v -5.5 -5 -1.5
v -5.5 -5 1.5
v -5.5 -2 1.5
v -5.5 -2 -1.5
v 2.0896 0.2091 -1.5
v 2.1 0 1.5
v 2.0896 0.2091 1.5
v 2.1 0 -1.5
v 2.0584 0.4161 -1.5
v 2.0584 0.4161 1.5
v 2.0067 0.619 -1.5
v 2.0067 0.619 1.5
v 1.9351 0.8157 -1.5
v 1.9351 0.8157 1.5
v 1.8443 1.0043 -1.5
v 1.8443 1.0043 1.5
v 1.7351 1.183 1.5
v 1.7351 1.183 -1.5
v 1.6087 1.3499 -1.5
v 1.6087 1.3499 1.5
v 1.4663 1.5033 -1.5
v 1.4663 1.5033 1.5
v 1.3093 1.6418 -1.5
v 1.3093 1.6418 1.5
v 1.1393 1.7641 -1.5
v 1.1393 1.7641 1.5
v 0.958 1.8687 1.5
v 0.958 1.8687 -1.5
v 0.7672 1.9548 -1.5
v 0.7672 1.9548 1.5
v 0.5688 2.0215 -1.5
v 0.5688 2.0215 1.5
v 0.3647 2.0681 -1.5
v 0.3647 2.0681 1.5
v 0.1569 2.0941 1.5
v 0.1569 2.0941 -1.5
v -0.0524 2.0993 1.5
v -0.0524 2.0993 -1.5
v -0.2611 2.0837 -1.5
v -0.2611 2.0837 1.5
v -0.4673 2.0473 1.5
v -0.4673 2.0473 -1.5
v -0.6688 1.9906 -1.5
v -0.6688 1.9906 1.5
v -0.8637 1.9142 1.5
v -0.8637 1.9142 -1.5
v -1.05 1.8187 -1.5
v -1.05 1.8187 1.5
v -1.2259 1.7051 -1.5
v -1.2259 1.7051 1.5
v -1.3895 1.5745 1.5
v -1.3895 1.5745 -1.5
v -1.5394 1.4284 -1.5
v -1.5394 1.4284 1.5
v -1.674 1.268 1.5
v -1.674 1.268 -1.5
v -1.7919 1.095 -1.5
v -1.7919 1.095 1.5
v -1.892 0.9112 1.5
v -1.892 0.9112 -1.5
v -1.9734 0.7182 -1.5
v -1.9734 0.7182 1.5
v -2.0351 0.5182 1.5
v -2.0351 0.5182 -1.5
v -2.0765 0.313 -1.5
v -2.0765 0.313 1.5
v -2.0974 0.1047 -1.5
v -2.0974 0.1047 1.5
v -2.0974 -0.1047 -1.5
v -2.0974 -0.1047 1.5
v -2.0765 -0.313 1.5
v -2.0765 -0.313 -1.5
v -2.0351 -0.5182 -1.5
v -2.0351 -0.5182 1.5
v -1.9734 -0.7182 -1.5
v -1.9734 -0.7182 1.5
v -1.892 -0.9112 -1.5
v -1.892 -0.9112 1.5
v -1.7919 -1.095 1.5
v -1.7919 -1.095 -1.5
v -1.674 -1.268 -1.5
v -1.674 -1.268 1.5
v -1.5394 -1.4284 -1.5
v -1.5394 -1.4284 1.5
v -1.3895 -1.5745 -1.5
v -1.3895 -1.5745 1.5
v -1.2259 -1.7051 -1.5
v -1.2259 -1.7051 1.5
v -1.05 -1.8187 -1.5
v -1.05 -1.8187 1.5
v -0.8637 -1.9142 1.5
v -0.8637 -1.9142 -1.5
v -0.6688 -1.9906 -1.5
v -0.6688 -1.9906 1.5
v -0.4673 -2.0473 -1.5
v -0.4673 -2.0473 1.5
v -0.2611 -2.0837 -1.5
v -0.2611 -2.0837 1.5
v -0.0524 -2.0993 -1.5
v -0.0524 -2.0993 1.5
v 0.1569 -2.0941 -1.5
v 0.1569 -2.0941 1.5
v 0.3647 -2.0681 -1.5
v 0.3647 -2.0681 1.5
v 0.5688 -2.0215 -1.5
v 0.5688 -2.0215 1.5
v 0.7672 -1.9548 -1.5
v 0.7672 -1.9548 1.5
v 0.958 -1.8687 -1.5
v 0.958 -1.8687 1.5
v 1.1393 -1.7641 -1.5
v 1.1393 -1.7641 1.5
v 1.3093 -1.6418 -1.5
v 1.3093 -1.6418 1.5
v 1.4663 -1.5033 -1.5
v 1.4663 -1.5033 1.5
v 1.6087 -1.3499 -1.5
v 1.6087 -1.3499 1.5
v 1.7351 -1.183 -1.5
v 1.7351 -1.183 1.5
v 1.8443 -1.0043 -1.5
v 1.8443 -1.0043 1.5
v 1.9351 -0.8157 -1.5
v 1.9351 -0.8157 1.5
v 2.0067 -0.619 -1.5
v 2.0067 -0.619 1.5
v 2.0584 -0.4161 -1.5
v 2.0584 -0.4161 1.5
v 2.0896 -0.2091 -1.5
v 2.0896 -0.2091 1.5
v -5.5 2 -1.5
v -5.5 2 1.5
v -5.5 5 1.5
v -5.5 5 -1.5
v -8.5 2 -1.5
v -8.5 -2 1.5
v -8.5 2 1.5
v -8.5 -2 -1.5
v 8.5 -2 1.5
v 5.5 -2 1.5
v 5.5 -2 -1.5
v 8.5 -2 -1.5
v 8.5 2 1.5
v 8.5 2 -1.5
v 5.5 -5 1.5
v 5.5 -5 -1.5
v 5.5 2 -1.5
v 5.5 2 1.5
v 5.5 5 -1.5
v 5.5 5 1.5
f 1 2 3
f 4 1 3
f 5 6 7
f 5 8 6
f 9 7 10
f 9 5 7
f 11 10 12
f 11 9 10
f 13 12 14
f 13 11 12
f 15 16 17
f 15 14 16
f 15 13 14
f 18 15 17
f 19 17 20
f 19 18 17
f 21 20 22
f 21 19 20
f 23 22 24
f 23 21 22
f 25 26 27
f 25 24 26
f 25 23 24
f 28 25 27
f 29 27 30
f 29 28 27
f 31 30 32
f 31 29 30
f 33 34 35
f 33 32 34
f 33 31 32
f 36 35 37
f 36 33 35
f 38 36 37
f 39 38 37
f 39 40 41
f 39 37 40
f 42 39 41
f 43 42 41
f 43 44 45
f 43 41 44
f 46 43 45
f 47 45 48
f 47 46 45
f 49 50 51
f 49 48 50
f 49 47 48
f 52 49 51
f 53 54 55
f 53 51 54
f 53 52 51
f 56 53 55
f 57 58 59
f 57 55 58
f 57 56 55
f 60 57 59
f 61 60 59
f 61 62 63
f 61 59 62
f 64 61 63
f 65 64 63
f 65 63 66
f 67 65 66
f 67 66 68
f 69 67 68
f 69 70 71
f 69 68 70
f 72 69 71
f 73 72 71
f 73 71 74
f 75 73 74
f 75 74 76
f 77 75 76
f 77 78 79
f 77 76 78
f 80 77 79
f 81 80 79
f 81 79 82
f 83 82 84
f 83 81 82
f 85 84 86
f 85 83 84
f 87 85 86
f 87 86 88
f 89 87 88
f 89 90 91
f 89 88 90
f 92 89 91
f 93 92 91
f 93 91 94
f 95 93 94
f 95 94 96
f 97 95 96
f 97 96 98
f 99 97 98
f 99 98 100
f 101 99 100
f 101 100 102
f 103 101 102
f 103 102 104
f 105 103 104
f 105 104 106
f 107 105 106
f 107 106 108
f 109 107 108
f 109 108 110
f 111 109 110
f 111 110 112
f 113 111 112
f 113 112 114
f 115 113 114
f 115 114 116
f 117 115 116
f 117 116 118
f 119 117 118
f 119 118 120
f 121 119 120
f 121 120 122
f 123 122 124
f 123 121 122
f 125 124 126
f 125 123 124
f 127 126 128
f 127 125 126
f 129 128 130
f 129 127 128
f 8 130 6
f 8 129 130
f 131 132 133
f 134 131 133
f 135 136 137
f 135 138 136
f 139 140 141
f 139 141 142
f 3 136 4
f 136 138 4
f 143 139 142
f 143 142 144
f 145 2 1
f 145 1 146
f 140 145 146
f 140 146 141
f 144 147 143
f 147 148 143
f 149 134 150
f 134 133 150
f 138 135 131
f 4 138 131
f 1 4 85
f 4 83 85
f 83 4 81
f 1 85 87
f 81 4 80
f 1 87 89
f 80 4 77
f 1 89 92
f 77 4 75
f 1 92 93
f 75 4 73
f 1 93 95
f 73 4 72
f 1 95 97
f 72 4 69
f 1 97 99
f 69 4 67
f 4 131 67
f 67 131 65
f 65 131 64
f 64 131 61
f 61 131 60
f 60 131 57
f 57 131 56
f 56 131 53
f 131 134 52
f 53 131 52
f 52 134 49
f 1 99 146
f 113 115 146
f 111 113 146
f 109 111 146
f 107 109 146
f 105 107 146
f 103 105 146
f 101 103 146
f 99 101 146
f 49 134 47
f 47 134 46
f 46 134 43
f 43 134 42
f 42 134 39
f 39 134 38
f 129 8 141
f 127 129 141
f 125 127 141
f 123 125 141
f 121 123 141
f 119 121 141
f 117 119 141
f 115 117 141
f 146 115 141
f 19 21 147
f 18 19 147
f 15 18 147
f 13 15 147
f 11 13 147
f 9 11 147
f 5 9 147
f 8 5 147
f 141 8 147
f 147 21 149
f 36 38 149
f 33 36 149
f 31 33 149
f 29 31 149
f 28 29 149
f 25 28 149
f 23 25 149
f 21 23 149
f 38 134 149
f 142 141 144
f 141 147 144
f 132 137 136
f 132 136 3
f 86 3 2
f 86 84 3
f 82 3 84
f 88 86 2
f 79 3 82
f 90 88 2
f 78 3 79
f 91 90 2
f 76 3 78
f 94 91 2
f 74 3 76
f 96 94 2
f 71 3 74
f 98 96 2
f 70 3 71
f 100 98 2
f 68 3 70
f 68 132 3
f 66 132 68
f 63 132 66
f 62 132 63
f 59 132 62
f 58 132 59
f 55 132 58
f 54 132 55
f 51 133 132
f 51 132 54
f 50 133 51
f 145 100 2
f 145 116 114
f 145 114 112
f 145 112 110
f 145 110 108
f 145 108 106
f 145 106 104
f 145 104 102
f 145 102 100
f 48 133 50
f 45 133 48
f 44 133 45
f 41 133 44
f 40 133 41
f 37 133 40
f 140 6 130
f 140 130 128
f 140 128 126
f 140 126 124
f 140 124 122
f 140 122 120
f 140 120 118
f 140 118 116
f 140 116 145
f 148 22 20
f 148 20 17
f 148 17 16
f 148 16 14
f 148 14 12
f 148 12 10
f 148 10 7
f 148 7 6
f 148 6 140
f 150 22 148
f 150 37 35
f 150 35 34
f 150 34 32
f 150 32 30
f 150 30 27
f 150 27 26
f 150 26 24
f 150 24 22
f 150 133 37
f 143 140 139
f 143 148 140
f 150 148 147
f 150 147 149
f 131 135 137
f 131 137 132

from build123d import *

# Parameters (mm, degrees)
SKETCH1_W               = 11
SKETCH1_H               = 10
BOSS_EXTRUDE1_DEPTH     = 1.5
SKETCH3_W               = 3
SKETCH3_H               = 4
BOSS_EXTRUDE2_DEPTH     = 1.5
CUT_EXTRUDE1_DEPTH      = 10.974968672
CUT_EXTRUDE1_DEPTH_BACK = 10.974968672
SKETCH4_R               = 2.1


with BuildPart() as part:
    # Sketch1 → Boss-Extrude1 (new, symmetric)
    with BuildSketch(Plane.XY):
        Rectangle(SKETCH1_W, SKETCH1_H)
    extrude(amount=BOSS_EXTRUDE1_DEPTH, both=True)

    # Sketch3 → Boss-Extrude2 (add, symmetric)
    with BuildSketch(Plane.XY):
        with Locations((-7, 0)):
            Rectangle(SKETCH3_W, SKETCH3_H)
        with Locations((7, 0)):
            Rectangle(SKETCH3_W, SKETCH3_H)
    extrude(amount=BOSS_EXTRUDE2_DEPTH, both=True)

    # Sketch4 → Cut-Extrude1 (cut, two sides: drawn at the far end of the back side and taken through both)
    with BuildSketch(Plane.XY.offset(-CUT_EXTRUDE1_DEPTH_BACK)):
        Circle(SKETCH4_R)
    extrude(amount=CUT_EXTRUDE1_DEPTH + CUT_EXTRUDE1_DEPTH_BACK, mode=Mode.SUBTRACT)


solid = part.part
